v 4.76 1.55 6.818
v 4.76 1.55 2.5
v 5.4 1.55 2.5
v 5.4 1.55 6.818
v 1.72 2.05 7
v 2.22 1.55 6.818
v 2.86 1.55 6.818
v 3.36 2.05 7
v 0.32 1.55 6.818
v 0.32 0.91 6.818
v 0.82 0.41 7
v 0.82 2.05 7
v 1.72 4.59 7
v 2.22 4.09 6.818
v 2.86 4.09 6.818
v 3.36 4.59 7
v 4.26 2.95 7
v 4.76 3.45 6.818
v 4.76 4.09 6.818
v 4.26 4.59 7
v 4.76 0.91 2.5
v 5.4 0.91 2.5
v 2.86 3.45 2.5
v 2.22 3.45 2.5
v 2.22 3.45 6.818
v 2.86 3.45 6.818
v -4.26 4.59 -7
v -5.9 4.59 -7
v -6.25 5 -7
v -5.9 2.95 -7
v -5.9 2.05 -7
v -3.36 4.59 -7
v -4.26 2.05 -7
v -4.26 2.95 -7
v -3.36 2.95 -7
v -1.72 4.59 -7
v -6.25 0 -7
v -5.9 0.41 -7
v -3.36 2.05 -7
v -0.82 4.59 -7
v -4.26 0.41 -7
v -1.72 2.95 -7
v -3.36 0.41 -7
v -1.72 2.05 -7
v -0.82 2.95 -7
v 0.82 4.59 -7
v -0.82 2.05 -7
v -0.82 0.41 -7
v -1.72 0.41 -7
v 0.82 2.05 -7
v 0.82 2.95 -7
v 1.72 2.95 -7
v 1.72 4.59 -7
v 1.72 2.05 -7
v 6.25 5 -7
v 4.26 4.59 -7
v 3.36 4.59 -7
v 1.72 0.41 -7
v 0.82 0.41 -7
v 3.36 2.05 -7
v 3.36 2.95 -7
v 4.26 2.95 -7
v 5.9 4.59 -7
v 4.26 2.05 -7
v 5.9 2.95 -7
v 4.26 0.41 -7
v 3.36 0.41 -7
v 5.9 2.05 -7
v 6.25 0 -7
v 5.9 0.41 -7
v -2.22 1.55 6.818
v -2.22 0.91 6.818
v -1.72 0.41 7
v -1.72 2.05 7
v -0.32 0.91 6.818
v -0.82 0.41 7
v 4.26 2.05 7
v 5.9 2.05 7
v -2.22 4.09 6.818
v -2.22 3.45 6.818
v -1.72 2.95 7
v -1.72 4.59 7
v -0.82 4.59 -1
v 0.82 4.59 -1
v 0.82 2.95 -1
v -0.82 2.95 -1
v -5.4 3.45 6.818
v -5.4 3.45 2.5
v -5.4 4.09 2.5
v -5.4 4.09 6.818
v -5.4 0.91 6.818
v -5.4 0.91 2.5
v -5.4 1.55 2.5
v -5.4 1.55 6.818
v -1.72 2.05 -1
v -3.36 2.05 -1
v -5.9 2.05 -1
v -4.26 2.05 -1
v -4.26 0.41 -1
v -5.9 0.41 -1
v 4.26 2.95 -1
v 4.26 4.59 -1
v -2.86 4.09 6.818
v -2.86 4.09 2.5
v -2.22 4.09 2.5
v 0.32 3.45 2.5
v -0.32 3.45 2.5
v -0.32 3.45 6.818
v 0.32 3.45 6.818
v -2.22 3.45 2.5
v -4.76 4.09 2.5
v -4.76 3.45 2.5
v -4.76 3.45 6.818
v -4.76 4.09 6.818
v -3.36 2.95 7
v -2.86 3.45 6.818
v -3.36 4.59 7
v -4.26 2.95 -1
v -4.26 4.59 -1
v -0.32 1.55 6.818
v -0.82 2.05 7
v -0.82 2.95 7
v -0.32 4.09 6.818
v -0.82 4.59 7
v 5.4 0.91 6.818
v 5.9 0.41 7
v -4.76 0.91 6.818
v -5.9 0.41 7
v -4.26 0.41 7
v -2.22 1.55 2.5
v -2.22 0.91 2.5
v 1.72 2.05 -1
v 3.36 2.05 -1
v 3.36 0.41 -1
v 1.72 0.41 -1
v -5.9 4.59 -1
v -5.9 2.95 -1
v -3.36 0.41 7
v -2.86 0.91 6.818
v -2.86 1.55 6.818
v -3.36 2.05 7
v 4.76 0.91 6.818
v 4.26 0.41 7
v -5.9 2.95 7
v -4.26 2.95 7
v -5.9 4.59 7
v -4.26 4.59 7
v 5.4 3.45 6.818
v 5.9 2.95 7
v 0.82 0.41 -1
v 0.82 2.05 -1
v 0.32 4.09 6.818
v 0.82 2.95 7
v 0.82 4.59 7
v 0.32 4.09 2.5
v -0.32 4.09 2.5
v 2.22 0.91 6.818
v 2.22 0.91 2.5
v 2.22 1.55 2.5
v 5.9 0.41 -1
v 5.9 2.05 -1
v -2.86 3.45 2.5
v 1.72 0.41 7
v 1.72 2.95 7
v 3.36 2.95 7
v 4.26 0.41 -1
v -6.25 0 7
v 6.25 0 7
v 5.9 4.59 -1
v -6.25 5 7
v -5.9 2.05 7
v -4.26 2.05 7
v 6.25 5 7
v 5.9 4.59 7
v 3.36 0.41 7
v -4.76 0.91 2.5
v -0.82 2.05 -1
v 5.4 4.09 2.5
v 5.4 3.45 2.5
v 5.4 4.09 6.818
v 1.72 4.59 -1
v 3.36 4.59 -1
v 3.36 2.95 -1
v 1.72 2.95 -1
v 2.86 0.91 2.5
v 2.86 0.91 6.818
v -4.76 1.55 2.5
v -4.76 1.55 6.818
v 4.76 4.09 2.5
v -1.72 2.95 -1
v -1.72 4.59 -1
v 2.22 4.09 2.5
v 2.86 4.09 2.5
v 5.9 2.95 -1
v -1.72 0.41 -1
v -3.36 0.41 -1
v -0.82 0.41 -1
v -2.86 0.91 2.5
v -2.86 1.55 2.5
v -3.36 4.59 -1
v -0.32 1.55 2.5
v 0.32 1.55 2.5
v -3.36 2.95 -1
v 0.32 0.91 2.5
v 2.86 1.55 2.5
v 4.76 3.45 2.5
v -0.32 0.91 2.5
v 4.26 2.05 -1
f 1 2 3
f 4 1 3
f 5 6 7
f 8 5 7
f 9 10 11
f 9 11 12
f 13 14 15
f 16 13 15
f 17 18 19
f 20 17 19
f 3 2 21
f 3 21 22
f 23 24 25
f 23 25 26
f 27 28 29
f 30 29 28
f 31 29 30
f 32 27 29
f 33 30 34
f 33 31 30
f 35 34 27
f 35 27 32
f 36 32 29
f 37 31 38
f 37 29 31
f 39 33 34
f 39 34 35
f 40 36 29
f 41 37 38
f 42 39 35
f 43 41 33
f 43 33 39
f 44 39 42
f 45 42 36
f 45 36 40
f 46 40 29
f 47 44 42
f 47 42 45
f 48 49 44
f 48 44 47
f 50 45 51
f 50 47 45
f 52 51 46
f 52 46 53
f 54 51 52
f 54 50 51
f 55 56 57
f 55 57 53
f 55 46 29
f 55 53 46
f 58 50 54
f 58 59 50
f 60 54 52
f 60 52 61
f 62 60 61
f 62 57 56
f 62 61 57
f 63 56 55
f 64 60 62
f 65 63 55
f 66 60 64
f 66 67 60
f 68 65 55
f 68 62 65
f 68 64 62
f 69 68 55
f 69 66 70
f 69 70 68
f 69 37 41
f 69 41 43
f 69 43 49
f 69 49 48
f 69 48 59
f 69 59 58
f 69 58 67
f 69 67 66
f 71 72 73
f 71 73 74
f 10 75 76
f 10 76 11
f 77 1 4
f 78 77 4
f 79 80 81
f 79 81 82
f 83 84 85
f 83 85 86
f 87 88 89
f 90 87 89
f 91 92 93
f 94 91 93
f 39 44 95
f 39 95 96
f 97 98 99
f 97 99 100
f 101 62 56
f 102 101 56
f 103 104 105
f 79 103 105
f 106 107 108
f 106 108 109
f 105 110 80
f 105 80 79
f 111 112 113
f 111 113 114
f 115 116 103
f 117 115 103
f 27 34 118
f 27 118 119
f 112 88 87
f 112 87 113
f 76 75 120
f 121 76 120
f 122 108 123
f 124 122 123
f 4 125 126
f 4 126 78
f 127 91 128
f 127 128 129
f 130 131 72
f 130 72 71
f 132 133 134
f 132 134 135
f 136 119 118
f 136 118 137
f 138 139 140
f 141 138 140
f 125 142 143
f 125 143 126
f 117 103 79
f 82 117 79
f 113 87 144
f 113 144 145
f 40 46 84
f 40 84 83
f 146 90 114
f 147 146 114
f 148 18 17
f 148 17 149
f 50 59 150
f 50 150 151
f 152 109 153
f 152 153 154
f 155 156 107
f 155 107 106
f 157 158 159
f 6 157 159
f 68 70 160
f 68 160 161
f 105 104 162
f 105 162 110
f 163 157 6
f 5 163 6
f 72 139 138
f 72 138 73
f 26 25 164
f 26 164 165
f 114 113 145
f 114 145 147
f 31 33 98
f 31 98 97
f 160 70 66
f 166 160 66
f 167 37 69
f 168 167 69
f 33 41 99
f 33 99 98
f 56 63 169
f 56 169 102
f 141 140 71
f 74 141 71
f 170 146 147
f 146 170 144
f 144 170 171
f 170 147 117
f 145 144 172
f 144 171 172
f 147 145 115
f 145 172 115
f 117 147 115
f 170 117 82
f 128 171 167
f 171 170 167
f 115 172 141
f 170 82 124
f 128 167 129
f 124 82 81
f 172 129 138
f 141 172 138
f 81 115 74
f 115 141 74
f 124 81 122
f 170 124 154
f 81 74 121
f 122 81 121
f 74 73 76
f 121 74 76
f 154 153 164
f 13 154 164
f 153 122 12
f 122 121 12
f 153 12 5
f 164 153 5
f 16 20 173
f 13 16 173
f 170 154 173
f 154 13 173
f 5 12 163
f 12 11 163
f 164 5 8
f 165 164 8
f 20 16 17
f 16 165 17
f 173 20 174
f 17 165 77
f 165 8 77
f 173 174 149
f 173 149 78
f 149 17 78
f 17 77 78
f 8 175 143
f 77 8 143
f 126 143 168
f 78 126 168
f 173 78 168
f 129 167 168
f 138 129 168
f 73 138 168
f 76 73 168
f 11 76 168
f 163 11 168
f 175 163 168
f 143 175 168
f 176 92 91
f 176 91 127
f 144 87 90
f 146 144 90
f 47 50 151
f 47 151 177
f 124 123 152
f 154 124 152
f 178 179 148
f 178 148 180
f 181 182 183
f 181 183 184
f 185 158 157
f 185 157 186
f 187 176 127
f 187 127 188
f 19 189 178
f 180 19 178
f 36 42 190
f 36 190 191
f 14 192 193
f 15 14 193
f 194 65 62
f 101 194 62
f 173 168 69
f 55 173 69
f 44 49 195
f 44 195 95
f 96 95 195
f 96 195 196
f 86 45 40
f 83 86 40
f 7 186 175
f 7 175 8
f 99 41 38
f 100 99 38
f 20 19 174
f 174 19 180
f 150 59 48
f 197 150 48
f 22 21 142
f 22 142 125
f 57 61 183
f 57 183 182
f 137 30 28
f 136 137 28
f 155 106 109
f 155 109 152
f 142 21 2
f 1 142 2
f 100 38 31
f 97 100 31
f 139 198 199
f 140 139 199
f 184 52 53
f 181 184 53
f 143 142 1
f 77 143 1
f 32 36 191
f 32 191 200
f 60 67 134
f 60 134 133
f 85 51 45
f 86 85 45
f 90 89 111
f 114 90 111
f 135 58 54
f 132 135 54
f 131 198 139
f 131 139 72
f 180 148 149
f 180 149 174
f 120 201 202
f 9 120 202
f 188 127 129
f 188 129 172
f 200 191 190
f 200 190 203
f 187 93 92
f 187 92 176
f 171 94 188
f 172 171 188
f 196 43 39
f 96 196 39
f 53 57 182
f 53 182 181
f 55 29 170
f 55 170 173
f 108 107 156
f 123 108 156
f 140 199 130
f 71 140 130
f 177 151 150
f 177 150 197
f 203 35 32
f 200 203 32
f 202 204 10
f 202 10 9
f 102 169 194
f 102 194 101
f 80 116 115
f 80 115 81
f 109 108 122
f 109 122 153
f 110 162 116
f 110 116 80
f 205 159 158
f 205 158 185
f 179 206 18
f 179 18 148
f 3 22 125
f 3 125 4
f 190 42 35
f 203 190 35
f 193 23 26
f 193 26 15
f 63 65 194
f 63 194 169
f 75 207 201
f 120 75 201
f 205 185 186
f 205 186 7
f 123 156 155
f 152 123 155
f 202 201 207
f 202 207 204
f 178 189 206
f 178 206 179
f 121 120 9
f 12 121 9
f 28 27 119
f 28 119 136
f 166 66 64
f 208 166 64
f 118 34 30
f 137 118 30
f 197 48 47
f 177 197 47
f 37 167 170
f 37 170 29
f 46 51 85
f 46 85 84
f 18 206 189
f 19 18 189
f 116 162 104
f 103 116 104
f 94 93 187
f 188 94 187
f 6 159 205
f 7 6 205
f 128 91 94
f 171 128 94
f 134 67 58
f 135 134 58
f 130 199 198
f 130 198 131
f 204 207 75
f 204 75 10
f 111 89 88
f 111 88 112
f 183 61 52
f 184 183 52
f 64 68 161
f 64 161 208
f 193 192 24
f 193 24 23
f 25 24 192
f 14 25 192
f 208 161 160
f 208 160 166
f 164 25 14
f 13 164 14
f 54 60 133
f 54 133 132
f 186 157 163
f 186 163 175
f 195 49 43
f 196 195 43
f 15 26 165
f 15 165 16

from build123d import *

# Parameters (mm, degrees)
SKETCH1_W           = 12.5
SKETCH1_H           = 14
BOSS_EXTRUDE1_DEPTH = 5
CUT_EXTRUDE1_START  = -4.5
SKETCH3_W           = 0.63999998
SKETCH3_H           = 0.639999981
SKETCH3_W_2         = 0.639999981
CUT_EXTRUDE1_DEPTH  = 4.5
CHAMFER1_SIZE       = 0.5
CHAMFER1_SIZE2      = 0.181985117
SKETCH4_W           = 1.639999981
SKETCH4_H           = 1.639999981
SKETCH4_W_2         = 1.63999998
CUT_EXTRUDE2_DEPTH  = 6


with BuildPart() as part:
    # Sketch1 → Boss-Extrude1 (new body)
    with BuildSketch(Plane(origin=(0, 0, 0), x_dir=(1, 0, 0), z_dir=(0, 1, 0))):
        Rectangle(SKETCH1_W, SKETCH1_H)
    extrude(amount=BOSS_EXTRUDE1_DEPTH)

    # Sketch3 → Cut-Extrude1 (cut)
    with BuildSketch(Plane.XY.offset(7).offset(CUT_EXTRUDE1_START)):
        with Locations((-5.080001681, 1.230026097)):
            Rectangle(SKETCH3_W, SKETCH3_H)
        with Locations((-2.540001758, 1.230026097)):
            Rectangle(SKETCH3_W_2, SKETCH3_H)
        with Locations((-1.834e-06, 1.230026097)):
            Rectangle(SKETCH3_W_2, SKETCH3_H)
        with Locations((2.539998088, 1.230026097)):
            Rectangle(SKETCH3_W_2, SKETCH3_H)
        with Locations((5.079998012, 1.230026097)):
            Rectangle(SKETCH3_W_2, SKETCH3_H)
        with Locations((5.079998012, 3.770026019)):
            Rectangle(SKETCH3_W_2, SKETCH3_H)
        with Locations((2.539998088, 3.770026019)):
            Rectangle(SKETCH3_W_2, SKETCH3_H)
        with Locations((-1.834e-06, 3.770026019)):
            Rectangle(SKETCH3_W_2, SKETCH3_H)
        with Locations((-2.540001758, 3.770026019)):
            Rectangle(SKETCH3_W_2, SKETCH3_H)
        with Locations((-5.080001681, 3.770026019)):
            Rectangle(SKETCH3_W, SKETCH3_H)
    extrude(amount=CUT_EXTRUDE1_DEPTH, mode=Mode.SUBTRACT)

    # Chamfer1
    chamfer1_edges = [part.edges().sort_by_distance(p)[0] for p in [
        (4.759998021, 1.230026096, 7),
        (5.079998011, 0.910026106, 7),
        (2.539998088, 1.550026087, 7),
        (2.219998098, 1.230026096, 7),
        (2.539998088, 0.910026106, 7),
        (2.859998079, 1.230026096, 7),
        (0.319998156, 1.230026096, 7),
        (-1.835e-06, 1.550026087, 7),
        (-0.320001825, 1.230026096, 7),
        (-1.835e-06, 0.910026106, 7),
        (-2.220001767, 1.230026096, 7),
        (-2.540001758, 1.550026087, 7),
        (-2.860001748, 1.230026096, 7),
        (-2.540001758, 0.910026106, 7),
        (-5.080001681, 0.910026106, 7),
        (-4.760001691, 1.230026096, 7),
        (-5.080001681, 1.550026087, 7),
        (-5.400001671, 1.230026096, 7),
        (-5.080001681, 3.450026029, 7),
        (-4.760001691, 3.77002602, 7),
        (-5.080001681, 4.09002601, 7),
        (-5.400001671, 3.77002602, 7),
        (-2.540001758, 4.09002601, 7),
        (-2.860001748, 3.77002602, 7),
        (-2.540001758, 3.450026029, 7),
        (-2.220001767, 3.77002602, 7),
        (0.319998156, 3.77002602, 7),
        (-1.835e-06, 4.09002601, 7),
        (-0.320001825, 3.77002602, 7),
        (-1.835e-06, 3.450026029, 7),
        (2.859998079, 3.77002602, 7),
        (2.539998088, 4.09002601, 7),
        (2.219998098, 3.77002602, 7),
        (2.539998088, 3.450026029, 7),
        (5.079998011, 4.09002601, 7),
        (4.759998021, 3.77002602, 7),
        (5.079998011, 3.450026029, 7),
        (5.399998002, 3.77002602, 7),
        (5.399998002, 1.230026096, 7),
        (5.079998011, 1.550026087, 7),
    ]]
    chamfer1_side = [part.faces().sort_by_distance(p)[0] for p in [
        (1.29e-07, 2.499998172, 7),
    ]]
    chamfer(chamfer1_edges, length=CHAMFER1_SIZE, length2=CHAMFER1_SIZE2, reference=chamfer1_side[0])

    # Sketch4 → Cut-Extrude2 (cut)
    with BuildSketch(Plane(origin=(0, 0, -7), x_dir=(-1, 0, 0), z_dir=(0, 0, -1))):
        with Locations((-5.079998012, 1.230026097)):
            Rectangle(SKETCH4_W, SKETCH4_H)
        with Locations((-2.539998088, 1.230026097)):
            Rectangle(SKETCH4_W, SKETCH4_H)
        with Locations((1.835e-06, 1.230026097)):
            Rectangle(SKETCH4_W, SKETCH4_H)
        with Locations((2.540001758, 1.230026097)):
            Rectangle(SKETCH4_W, SKETCH4_H)
        with Locations((5.080001681, 1.230026097)):
            Rectangle(SKETCH4_W_2, SKETCH4_H)
        with Locations((5.080001681, 3.770026019)):
            Rectangle(SKETCH4_W_2, SKETCH4_H)
        with Locations((2.540001758, 3.770026019)):
            Rectangle(SKETCH4_W, SKETCH4_H)
        with Locations((1.835e-06, 3.770026019)):
            Rectangle(SKETCH4_W, SKETCH4_H)
        with Locations((-2.539998088, 3.770026019)):
            Rectangle(SKETCH4_W, SKETCH4_H)
        with Locations((-5.079998012, 3.770026019)):
            Rectangle(SKETCH4_W, SKETCH4_H)
    extrude(amount=-CUT_EXTRUDE2_DEPTH, mode=Mode.SUBTRACT)


solid = part.part
